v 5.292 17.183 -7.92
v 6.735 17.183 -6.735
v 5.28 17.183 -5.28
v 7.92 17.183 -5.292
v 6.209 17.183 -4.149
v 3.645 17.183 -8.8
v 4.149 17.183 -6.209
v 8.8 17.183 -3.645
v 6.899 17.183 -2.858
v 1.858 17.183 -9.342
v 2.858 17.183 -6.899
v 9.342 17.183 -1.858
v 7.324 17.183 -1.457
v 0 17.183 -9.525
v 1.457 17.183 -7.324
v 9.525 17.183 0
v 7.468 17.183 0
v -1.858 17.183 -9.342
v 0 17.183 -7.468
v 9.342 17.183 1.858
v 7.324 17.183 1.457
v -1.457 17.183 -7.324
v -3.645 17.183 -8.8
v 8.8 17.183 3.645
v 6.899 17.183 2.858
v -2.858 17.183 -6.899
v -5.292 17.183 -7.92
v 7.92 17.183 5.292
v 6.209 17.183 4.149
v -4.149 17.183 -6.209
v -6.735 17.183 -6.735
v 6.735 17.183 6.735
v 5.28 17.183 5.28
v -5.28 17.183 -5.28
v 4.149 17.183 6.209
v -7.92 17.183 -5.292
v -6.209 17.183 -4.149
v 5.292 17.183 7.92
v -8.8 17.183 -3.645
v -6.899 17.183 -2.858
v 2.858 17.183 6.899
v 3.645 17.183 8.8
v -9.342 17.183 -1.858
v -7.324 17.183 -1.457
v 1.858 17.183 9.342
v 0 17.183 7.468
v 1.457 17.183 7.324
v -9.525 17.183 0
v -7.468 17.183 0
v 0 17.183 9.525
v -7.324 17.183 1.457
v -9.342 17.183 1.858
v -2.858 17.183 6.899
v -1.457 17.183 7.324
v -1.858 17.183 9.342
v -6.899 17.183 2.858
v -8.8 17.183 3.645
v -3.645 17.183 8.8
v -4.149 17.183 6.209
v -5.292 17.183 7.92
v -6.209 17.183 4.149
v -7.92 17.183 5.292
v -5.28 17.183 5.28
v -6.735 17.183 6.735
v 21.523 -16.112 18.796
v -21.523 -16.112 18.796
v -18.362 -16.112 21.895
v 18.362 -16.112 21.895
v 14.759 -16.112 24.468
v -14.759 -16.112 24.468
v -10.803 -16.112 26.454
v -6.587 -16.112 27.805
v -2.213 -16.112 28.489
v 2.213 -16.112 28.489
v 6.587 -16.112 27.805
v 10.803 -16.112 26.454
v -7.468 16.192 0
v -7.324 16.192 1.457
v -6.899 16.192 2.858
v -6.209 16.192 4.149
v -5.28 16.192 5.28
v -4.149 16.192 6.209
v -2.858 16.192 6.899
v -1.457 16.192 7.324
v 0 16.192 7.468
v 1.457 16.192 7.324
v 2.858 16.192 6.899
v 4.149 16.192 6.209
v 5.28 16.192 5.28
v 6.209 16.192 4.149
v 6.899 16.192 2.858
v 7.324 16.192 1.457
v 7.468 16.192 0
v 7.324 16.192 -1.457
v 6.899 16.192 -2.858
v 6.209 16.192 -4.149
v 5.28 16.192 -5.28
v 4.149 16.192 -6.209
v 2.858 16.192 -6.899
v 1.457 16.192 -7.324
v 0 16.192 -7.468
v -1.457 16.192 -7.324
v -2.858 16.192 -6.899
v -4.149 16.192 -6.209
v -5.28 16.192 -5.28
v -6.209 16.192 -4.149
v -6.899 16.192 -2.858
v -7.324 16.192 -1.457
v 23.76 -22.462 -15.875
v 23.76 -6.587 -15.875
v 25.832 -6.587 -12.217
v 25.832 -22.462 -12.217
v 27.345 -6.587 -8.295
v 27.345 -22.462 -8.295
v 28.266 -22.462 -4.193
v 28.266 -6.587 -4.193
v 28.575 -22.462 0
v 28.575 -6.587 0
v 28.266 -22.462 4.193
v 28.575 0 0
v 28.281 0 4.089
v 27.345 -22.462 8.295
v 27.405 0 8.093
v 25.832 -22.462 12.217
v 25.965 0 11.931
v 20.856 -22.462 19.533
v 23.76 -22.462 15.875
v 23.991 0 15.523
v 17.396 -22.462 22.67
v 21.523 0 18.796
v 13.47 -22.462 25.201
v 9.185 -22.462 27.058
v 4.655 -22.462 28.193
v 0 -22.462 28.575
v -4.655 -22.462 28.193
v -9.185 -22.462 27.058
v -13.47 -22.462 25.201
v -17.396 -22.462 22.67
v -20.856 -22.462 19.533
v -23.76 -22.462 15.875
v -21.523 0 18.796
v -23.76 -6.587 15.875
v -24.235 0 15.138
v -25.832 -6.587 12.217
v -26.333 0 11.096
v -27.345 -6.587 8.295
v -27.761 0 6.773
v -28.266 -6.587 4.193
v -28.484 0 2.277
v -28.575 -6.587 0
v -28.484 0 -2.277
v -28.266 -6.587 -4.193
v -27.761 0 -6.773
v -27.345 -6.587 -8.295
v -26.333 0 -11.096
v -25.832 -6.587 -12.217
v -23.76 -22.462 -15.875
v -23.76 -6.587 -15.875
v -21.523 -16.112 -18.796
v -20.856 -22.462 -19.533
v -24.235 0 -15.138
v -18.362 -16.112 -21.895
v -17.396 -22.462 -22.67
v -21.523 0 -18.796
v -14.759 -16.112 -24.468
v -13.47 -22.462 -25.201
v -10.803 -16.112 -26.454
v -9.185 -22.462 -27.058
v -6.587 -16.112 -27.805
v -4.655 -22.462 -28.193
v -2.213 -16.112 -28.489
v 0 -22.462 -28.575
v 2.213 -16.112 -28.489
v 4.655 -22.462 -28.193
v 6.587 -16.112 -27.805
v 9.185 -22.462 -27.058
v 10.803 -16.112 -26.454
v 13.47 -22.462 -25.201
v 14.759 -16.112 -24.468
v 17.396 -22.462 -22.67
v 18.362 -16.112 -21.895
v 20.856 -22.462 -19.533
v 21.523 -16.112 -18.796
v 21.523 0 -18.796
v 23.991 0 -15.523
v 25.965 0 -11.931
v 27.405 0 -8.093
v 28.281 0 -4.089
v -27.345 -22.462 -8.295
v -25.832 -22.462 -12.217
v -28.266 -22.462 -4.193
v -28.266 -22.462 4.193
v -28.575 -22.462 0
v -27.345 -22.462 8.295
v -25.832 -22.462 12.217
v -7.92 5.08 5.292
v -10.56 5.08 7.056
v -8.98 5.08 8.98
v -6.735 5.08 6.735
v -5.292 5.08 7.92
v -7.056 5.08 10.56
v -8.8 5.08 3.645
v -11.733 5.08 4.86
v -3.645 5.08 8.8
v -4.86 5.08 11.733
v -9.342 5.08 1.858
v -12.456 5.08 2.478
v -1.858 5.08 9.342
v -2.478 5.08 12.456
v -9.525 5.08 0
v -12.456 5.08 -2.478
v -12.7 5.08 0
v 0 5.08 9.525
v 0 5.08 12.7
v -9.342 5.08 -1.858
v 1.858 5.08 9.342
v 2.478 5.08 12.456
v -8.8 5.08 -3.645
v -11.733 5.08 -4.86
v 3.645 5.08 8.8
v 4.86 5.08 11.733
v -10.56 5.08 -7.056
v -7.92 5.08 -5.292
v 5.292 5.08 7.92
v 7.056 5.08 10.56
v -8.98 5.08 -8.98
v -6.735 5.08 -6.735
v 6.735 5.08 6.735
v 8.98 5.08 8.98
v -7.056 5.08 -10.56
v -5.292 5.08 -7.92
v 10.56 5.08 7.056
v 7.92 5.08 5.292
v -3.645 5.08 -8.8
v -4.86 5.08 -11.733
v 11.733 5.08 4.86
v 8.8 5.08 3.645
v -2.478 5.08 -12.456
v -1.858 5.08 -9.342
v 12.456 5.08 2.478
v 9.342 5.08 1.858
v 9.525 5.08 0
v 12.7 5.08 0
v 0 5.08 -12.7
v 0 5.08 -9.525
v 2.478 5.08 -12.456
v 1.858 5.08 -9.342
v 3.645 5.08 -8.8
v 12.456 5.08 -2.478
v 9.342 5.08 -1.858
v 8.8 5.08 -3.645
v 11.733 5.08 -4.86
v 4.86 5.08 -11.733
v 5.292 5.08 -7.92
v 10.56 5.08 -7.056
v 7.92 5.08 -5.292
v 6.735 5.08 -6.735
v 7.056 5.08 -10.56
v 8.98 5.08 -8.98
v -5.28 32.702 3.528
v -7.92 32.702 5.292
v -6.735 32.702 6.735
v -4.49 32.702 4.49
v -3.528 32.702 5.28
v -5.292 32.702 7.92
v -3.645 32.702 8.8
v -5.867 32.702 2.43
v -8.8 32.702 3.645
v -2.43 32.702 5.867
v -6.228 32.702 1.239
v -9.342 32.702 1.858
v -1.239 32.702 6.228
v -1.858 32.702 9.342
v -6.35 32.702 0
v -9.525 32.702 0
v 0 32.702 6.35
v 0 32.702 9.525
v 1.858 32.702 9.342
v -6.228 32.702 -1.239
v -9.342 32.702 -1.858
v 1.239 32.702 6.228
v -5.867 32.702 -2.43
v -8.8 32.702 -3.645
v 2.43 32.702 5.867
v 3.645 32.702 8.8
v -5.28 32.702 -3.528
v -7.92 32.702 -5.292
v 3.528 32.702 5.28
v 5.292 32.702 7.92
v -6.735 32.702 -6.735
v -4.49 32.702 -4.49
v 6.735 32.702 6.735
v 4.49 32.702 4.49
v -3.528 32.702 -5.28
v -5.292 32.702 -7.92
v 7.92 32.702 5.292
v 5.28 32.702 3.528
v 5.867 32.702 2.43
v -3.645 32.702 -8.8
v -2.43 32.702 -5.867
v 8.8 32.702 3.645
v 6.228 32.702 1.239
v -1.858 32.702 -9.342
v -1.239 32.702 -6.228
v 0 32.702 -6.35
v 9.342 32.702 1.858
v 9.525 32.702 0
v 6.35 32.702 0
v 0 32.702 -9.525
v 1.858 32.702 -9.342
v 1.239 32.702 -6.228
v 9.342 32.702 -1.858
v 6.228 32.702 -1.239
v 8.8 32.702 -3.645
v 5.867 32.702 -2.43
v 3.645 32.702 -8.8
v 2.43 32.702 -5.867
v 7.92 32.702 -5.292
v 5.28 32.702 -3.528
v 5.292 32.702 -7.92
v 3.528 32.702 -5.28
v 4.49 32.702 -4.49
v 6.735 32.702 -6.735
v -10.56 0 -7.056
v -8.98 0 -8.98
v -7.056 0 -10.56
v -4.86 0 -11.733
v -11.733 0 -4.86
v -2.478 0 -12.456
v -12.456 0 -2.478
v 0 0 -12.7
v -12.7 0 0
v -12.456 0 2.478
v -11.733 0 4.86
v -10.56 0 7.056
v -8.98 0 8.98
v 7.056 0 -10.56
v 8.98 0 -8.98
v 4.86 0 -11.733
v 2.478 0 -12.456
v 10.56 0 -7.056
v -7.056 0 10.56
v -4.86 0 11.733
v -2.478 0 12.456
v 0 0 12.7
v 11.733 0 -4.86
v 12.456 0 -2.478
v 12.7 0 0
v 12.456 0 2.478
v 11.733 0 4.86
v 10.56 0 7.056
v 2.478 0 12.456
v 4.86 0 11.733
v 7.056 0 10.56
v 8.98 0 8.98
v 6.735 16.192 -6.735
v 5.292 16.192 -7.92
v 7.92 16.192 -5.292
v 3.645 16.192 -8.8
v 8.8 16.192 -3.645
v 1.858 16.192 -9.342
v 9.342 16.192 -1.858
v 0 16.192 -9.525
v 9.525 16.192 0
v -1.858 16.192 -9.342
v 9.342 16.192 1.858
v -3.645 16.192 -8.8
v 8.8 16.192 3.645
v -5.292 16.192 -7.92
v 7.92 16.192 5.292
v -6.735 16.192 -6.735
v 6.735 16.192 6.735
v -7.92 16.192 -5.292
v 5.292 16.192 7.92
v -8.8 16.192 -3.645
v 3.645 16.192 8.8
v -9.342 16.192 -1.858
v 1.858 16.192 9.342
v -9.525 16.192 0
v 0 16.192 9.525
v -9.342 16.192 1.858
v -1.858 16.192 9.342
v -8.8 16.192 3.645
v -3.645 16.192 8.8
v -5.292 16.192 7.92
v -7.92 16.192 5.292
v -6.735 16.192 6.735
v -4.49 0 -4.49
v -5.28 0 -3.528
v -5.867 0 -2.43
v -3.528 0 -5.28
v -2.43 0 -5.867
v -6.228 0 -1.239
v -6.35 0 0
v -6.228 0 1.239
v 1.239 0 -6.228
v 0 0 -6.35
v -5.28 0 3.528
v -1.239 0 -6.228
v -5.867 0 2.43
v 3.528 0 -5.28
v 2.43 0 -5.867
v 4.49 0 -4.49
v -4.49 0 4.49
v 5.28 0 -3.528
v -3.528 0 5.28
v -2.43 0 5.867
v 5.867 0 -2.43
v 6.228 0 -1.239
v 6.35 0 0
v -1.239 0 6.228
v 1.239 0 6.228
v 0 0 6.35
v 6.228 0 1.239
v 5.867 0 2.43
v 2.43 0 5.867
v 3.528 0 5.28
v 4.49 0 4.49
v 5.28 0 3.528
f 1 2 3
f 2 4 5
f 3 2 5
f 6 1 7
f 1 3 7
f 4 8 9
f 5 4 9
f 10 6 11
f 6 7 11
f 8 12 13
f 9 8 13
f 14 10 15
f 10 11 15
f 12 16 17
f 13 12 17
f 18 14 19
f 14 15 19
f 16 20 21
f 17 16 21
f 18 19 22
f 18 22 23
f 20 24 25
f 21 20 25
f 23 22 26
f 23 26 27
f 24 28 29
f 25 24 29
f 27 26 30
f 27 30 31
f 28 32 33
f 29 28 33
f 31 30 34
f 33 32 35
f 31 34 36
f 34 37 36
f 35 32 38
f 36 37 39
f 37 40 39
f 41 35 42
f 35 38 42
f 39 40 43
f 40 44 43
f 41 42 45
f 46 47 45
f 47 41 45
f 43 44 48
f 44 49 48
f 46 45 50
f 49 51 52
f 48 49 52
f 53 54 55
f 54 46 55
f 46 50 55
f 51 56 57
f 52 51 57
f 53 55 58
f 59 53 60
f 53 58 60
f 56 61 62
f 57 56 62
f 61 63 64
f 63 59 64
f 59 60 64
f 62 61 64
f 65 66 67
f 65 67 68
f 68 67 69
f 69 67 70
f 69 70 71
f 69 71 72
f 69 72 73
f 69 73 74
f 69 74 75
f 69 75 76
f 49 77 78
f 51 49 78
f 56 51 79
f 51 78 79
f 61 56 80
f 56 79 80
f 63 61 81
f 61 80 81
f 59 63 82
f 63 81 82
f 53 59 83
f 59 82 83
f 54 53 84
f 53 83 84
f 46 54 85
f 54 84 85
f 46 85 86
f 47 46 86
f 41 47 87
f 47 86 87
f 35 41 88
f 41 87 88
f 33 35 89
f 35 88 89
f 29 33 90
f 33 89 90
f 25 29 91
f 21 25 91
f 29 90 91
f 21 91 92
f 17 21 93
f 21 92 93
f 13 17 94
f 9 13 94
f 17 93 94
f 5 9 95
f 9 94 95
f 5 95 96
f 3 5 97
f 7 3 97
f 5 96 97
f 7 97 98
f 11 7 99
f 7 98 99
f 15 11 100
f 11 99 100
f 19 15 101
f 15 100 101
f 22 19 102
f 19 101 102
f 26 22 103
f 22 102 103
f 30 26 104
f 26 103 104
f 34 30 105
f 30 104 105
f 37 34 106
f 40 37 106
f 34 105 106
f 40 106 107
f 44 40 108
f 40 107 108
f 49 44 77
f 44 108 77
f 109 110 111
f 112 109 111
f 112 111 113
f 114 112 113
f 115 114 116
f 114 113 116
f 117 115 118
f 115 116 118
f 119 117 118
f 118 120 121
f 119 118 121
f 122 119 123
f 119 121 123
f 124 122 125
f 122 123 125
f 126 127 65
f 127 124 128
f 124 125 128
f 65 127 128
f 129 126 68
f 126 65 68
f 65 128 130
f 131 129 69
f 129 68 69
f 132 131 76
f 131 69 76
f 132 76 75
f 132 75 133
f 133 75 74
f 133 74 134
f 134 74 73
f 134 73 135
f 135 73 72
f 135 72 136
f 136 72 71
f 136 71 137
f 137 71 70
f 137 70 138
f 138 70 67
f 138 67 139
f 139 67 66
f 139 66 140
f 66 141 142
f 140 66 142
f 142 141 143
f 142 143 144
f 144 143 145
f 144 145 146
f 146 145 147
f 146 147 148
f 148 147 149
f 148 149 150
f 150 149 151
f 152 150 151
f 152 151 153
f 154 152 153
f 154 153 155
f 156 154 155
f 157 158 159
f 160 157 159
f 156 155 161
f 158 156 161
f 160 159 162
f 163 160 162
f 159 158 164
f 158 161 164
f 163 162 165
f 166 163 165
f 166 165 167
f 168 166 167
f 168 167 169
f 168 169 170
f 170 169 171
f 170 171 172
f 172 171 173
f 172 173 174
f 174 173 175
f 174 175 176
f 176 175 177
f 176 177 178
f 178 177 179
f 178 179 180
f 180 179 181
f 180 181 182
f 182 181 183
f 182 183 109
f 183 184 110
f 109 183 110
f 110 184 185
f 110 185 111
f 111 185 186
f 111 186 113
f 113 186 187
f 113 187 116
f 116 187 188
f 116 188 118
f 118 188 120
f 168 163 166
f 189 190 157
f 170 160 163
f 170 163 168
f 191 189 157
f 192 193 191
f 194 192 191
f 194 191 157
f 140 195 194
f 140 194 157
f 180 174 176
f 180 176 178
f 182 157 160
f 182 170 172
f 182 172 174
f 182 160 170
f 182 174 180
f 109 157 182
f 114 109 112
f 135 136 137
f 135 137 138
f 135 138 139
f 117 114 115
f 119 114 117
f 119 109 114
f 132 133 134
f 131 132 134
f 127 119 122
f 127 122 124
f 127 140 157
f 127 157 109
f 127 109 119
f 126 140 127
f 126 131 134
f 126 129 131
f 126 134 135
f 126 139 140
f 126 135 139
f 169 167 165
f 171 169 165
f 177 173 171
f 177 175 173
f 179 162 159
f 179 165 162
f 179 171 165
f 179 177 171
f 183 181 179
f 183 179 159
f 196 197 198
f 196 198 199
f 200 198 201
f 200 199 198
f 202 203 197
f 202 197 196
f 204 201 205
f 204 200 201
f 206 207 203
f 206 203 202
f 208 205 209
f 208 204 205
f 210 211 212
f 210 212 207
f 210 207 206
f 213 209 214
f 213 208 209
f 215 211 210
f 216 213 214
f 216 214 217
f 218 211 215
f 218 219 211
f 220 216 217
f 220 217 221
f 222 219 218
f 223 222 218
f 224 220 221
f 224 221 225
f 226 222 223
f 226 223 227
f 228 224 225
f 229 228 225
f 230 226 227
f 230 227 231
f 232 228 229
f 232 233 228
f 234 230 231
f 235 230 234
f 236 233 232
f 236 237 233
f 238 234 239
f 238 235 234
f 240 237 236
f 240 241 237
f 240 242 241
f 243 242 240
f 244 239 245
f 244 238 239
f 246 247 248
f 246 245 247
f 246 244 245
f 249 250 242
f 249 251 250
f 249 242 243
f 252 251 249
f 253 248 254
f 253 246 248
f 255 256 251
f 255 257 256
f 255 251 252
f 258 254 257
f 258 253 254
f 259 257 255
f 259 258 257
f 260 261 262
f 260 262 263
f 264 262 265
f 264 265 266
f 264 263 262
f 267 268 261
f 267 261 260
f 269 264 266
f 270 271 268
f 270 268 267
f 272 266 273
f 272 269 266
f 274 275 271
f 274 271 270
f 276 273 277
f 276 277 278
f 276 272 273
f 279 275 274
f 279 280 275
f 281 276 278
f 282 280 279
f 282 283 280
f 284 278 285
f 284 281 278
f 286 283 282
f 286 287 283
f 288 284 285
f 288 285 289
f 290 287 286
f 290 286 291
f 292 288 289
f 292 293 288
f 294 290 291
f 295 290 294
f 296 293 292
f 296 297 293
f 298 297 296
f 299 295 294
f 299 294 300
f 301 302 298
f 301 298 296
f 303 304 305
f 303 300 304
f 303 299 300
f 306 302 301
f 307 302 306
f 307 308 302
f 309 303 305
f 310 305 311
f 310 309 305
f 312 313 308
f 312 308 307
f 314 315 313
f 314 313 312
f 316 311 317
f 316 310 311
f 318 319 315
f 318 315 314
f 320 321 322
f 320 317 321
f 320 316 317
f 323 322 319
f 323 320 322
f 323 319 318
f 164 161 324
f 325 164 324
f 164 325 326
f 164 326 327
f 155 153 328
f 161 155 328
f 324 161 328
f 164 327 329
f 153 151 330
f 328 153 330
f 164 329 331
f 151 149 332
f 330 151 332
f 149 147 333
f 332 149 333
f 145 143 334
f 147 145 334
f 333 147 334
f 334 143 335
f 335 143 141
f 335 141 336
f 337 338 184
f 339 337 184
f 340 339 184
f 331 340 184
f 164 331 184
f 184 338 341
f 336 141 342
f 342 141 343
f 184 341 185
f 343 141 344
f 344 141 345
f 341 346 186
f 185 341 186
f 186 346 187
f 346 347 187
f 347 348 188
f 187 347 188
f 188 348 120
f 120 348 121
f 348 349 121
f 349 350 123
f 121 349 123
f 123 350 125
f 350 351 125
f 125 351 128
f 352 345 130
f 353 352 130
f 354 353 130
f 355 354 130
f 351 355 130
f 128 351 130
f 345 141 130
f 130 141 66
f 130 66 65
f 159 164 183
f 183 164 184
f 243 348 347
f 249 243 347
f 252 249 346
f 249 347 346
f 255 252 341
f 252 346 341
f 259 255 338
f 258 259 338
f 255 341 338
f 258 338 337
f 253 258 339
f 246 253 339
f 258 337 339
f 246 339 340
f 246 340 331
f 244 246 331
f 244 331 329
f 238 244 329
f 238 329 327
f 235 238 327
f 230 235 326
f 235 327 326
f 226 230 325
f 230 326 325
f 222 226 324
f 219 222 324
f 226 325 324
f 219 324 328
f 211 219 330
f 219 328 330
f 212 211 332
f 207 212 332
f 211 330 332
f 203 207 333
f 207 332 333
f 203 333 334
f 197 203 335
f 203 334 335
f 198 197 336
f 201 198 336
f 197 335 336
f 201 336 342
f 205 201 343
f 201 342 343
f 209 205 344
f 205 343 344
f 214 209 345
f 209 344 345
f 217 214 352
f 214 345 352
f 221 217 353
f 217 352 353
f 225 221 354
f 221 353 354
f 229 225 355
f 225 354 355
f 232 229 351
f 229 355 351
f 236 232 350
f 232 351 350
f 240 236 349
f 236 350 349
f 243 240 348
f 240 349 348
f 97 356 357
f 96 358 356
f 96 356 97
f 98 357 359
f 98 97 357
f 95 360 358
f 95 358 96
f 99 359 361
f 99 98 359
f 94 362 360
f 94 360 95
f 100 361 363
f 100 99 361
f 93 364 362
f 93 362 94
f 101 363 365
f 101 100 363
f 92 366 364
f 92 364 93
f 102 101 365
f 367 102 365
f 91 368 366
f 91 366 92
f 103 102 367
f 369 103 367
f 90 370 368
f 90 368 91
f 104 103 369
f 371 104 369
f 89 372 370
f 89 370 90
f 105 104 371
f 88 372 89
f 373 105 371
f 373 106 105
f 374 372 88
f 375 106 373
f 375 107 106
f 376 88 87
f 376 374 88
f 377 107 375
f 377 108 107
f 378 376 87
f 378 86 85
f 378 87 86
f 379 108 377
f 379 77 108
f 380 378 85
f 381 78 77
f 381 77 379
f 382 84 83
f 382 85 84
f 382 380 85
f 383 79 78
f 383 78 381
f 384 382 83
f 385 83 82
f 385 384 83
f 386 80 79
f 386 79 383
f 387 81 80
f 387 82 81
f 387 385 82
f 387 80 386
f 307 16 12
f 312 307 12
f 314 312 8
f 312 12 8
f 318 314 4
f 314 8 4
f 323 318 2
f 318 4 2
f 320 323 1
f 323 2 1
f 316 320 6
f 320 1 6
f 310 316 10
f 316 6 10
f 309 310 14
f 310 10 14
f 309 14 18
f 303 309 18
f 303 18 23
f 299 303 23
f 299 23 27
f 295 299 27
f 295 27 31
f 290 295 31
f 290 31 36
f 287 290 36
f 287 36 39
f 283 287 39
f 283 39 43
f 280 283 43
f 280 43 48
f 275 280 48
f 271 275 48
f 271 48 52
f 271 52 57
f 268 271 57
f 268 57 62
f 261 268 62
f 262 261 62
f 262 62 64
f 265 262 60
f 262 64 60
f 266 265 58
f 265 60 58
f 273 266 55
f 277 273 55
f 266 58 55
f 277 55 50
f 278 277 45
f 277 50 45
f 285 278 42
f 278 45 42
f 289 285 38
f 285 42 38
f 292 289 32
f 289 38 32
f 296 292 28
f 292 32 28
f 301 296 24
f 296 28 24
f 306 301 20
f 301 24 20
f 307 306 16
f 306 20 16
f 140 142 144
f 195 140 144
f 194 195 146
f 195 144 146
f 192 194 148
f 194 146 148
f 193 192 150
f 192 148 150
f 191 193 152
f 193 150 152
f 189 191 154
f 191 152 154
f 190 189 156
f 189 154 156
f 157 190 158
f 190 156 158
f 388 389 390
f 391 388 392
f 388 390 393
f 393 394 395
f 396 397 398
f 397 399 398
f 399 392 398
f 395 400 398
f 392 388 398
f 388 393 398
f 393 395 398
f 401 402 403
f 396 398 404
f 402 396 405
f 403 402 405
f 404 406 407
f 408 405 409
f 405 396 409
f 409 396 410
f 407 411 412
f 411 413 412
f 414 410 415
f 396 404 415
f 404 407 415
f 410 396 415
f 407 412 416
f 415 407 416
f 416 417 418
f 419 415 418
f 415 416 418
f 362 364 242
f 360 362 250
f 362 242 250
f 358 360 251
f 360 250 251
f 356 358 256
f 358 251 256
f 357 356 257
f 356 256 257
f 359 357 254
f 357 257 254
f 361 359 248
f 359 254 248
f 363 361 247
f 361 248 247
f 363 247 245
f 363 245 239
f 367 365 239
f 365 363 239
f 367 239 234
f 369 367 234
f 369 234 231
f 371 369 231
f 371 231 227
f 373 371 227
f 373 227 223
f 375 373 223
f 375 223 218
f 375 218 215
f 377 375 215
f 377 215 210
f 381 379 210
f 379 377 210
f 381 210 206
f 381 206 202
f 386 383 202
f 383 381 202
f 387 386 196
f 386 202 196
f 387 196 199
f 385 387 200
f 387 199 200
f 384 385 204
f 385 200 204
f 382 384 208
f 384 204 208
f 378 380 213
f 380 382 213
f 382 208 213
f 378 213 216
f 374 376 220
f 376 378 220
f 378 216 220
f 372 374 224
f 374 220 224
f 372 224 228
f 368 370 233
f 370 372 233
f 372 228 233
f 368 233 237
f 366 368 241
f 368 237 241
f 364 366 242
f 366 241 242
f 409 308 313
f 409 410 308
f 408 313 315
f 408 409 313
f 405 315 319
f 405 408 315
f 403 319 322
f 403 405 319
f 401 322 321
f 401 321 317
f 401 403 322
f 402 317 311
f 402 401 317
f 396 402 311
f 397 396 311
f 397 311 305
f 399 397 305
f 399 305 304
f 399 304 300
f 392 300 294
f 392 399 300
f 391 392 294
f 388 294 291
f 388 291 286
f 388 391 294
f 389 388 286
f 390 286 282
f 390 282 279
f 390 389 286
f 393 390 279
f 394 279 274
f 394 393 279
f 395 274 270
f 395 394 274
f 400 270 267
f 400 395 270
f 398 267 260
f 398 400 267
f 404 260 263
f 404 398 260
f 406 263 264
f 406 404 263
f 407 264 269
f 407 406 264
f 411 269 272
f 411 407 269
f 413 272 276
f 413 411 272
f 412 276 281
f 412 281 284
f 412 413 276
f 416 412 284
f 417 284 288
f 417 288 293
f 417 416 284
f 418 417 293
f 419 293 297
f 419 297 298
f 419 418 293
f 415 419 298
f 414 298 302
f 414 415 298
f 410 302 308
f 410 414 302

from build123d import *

# Parameters (mm, degrees)
SKETCH1_R           = 12.7
SKETCH1_R_2         = 6.35
BOSS_EXTRUDE1_DEPTH = 5.08
SKETCH2_R           = 9.525
SKETCH2_R_2         = 6.35
BOSS_EXTRUDE2_DEPTH = 27.6225
SKETCH3_OUTSIDE_W   = 37.116
SKETCH3_OUTSIDE_H   = 37.116
SKETCH3_OUTSIDE_R   = 7.4676
CUT_EXTRUDE1_DEPTH  = 0.9906
SKETCH5_R           = 28.575
BOSS_EXTRUDE4_DEPTH = 6.587499906
BOSS_EXTRUDE5_DEPTH = 15.875
SKETCH12_W          = 57.15
SKETCH12_H          = 9.779
CUT_EXTRUDE2_DEPTH  = 16.1125
BOSS_EXTRUDE6_DEPTH = 15.875


with BuildPart() as part:
    # Sketch1 → Boss-Extrude1 (new body)
    with BuildSketch(Plane(origin=(0, 0, 0), x_dir=(1, 0, 0), z_dir=(0, 1, 0))):
        Circle(SKETCH1_R)
        Circle(SKETCH1_R_2, mode=Mode.SUBTRACT)
    extrude(amount=BOSS_EXTRUDE1_DEPTH)

    # Sketch2 → Boss-Extrude2 (add)
    with BuildSketch(Plane(origin=(0, 5.08, 0), x_dir=(1, 0, 0), z_dir=(0, 1, 0))):
        Circle(SKETCH2_R)
        Circle(SKETCH2_R_2, mode=Mode.SUBTRACT)
    extrude(amount=BOSS_EXTRUDE2_DEPTH)

    # Sketch3 outside → Cut-Extrude1 (cut)
    with BuildSketch(Plane(origin=(0, 16.1925, 0), x_dir=(-1, 0, 0), z_dir=(0, 1, 0))):
        Rectangle(SKETCH3_OUTSIDE_W, SKETCH3_OUTSIDE_H)
        Circle(SKETCH3_OUTSIDE_R, mode=Mode.SUBTRACT)
    extrude(amount=CUT_EXTRUDE1_DEPTH, mode=Mode.SUBTRACT)

    # Sketch5 → Boss-Extrude4 (add)
    with BuildSketch(Plane.XZ):
        Circle(SKETCH5_R)
    extrude(amount=BOSS_EXTRUDE4_DEPTH)

    # Sketch8 → Boss-Extrude5 (add)
    with BuildSketch(Plane.XZ.offset(6.587499906)):
        with BuildLine():
            Line((23.759524406, -15.875), (-23.759524406, -15.875))
            ThreePointArc((-23.759524406, -15.875), (0, -28.575), (23.759524406, -15.875))
        make_face()
        with BuildLine():
            ThreePointArc((23.759524406, 15.875), (0, 28.575), (-23.759524406, 15.875))
            Line((-23.759524406, 15.875), (23.759524406, 15.875))
        make_face()
    extrude(amount=BOSS_EXTRUDE5_DEPTH)

    # Sketch12 → Cut-Extrude2 (cut)
    with BuildSketch(Plane(origin=(0, 0, 0), x_dir=(1, 0, 0), z_dir=(0, 1, 0))):
        with Locations((0, 23.6855)):
            Rectangle(SKETCH12_W, SKETCH12_H)
        with Locations((0, -23.6855)):
            Rectangle(SKETCH12_W, SKETCH12_H)
    extrude(amount=-CUT_EXTRUDE2_DEPTH, mode=Mode.SUBTRACT)

    # Sketch13 → Boss-Extrude6 (add)
    with BuildSketch(Plane.XZ.offset(6.587499906)):
        with BuildLine():
            Line((23.759524406, 15.875), (-23.759524406, 15.875))
            ThreePointArc((-23.759524406, 15.875), (-28.575, 0), (-23.759524406, -15.875))
            Line((-23.759524406, -15.875), (23.759524406, -15.875))
            ThreePointArc((23.759524406, -15.875), (28.575, 0), (23.759524406, 15.875))
        make_face()
    extrude(amount=BOSS_EXTRUDE6_DEPTH)


solid = part.part
